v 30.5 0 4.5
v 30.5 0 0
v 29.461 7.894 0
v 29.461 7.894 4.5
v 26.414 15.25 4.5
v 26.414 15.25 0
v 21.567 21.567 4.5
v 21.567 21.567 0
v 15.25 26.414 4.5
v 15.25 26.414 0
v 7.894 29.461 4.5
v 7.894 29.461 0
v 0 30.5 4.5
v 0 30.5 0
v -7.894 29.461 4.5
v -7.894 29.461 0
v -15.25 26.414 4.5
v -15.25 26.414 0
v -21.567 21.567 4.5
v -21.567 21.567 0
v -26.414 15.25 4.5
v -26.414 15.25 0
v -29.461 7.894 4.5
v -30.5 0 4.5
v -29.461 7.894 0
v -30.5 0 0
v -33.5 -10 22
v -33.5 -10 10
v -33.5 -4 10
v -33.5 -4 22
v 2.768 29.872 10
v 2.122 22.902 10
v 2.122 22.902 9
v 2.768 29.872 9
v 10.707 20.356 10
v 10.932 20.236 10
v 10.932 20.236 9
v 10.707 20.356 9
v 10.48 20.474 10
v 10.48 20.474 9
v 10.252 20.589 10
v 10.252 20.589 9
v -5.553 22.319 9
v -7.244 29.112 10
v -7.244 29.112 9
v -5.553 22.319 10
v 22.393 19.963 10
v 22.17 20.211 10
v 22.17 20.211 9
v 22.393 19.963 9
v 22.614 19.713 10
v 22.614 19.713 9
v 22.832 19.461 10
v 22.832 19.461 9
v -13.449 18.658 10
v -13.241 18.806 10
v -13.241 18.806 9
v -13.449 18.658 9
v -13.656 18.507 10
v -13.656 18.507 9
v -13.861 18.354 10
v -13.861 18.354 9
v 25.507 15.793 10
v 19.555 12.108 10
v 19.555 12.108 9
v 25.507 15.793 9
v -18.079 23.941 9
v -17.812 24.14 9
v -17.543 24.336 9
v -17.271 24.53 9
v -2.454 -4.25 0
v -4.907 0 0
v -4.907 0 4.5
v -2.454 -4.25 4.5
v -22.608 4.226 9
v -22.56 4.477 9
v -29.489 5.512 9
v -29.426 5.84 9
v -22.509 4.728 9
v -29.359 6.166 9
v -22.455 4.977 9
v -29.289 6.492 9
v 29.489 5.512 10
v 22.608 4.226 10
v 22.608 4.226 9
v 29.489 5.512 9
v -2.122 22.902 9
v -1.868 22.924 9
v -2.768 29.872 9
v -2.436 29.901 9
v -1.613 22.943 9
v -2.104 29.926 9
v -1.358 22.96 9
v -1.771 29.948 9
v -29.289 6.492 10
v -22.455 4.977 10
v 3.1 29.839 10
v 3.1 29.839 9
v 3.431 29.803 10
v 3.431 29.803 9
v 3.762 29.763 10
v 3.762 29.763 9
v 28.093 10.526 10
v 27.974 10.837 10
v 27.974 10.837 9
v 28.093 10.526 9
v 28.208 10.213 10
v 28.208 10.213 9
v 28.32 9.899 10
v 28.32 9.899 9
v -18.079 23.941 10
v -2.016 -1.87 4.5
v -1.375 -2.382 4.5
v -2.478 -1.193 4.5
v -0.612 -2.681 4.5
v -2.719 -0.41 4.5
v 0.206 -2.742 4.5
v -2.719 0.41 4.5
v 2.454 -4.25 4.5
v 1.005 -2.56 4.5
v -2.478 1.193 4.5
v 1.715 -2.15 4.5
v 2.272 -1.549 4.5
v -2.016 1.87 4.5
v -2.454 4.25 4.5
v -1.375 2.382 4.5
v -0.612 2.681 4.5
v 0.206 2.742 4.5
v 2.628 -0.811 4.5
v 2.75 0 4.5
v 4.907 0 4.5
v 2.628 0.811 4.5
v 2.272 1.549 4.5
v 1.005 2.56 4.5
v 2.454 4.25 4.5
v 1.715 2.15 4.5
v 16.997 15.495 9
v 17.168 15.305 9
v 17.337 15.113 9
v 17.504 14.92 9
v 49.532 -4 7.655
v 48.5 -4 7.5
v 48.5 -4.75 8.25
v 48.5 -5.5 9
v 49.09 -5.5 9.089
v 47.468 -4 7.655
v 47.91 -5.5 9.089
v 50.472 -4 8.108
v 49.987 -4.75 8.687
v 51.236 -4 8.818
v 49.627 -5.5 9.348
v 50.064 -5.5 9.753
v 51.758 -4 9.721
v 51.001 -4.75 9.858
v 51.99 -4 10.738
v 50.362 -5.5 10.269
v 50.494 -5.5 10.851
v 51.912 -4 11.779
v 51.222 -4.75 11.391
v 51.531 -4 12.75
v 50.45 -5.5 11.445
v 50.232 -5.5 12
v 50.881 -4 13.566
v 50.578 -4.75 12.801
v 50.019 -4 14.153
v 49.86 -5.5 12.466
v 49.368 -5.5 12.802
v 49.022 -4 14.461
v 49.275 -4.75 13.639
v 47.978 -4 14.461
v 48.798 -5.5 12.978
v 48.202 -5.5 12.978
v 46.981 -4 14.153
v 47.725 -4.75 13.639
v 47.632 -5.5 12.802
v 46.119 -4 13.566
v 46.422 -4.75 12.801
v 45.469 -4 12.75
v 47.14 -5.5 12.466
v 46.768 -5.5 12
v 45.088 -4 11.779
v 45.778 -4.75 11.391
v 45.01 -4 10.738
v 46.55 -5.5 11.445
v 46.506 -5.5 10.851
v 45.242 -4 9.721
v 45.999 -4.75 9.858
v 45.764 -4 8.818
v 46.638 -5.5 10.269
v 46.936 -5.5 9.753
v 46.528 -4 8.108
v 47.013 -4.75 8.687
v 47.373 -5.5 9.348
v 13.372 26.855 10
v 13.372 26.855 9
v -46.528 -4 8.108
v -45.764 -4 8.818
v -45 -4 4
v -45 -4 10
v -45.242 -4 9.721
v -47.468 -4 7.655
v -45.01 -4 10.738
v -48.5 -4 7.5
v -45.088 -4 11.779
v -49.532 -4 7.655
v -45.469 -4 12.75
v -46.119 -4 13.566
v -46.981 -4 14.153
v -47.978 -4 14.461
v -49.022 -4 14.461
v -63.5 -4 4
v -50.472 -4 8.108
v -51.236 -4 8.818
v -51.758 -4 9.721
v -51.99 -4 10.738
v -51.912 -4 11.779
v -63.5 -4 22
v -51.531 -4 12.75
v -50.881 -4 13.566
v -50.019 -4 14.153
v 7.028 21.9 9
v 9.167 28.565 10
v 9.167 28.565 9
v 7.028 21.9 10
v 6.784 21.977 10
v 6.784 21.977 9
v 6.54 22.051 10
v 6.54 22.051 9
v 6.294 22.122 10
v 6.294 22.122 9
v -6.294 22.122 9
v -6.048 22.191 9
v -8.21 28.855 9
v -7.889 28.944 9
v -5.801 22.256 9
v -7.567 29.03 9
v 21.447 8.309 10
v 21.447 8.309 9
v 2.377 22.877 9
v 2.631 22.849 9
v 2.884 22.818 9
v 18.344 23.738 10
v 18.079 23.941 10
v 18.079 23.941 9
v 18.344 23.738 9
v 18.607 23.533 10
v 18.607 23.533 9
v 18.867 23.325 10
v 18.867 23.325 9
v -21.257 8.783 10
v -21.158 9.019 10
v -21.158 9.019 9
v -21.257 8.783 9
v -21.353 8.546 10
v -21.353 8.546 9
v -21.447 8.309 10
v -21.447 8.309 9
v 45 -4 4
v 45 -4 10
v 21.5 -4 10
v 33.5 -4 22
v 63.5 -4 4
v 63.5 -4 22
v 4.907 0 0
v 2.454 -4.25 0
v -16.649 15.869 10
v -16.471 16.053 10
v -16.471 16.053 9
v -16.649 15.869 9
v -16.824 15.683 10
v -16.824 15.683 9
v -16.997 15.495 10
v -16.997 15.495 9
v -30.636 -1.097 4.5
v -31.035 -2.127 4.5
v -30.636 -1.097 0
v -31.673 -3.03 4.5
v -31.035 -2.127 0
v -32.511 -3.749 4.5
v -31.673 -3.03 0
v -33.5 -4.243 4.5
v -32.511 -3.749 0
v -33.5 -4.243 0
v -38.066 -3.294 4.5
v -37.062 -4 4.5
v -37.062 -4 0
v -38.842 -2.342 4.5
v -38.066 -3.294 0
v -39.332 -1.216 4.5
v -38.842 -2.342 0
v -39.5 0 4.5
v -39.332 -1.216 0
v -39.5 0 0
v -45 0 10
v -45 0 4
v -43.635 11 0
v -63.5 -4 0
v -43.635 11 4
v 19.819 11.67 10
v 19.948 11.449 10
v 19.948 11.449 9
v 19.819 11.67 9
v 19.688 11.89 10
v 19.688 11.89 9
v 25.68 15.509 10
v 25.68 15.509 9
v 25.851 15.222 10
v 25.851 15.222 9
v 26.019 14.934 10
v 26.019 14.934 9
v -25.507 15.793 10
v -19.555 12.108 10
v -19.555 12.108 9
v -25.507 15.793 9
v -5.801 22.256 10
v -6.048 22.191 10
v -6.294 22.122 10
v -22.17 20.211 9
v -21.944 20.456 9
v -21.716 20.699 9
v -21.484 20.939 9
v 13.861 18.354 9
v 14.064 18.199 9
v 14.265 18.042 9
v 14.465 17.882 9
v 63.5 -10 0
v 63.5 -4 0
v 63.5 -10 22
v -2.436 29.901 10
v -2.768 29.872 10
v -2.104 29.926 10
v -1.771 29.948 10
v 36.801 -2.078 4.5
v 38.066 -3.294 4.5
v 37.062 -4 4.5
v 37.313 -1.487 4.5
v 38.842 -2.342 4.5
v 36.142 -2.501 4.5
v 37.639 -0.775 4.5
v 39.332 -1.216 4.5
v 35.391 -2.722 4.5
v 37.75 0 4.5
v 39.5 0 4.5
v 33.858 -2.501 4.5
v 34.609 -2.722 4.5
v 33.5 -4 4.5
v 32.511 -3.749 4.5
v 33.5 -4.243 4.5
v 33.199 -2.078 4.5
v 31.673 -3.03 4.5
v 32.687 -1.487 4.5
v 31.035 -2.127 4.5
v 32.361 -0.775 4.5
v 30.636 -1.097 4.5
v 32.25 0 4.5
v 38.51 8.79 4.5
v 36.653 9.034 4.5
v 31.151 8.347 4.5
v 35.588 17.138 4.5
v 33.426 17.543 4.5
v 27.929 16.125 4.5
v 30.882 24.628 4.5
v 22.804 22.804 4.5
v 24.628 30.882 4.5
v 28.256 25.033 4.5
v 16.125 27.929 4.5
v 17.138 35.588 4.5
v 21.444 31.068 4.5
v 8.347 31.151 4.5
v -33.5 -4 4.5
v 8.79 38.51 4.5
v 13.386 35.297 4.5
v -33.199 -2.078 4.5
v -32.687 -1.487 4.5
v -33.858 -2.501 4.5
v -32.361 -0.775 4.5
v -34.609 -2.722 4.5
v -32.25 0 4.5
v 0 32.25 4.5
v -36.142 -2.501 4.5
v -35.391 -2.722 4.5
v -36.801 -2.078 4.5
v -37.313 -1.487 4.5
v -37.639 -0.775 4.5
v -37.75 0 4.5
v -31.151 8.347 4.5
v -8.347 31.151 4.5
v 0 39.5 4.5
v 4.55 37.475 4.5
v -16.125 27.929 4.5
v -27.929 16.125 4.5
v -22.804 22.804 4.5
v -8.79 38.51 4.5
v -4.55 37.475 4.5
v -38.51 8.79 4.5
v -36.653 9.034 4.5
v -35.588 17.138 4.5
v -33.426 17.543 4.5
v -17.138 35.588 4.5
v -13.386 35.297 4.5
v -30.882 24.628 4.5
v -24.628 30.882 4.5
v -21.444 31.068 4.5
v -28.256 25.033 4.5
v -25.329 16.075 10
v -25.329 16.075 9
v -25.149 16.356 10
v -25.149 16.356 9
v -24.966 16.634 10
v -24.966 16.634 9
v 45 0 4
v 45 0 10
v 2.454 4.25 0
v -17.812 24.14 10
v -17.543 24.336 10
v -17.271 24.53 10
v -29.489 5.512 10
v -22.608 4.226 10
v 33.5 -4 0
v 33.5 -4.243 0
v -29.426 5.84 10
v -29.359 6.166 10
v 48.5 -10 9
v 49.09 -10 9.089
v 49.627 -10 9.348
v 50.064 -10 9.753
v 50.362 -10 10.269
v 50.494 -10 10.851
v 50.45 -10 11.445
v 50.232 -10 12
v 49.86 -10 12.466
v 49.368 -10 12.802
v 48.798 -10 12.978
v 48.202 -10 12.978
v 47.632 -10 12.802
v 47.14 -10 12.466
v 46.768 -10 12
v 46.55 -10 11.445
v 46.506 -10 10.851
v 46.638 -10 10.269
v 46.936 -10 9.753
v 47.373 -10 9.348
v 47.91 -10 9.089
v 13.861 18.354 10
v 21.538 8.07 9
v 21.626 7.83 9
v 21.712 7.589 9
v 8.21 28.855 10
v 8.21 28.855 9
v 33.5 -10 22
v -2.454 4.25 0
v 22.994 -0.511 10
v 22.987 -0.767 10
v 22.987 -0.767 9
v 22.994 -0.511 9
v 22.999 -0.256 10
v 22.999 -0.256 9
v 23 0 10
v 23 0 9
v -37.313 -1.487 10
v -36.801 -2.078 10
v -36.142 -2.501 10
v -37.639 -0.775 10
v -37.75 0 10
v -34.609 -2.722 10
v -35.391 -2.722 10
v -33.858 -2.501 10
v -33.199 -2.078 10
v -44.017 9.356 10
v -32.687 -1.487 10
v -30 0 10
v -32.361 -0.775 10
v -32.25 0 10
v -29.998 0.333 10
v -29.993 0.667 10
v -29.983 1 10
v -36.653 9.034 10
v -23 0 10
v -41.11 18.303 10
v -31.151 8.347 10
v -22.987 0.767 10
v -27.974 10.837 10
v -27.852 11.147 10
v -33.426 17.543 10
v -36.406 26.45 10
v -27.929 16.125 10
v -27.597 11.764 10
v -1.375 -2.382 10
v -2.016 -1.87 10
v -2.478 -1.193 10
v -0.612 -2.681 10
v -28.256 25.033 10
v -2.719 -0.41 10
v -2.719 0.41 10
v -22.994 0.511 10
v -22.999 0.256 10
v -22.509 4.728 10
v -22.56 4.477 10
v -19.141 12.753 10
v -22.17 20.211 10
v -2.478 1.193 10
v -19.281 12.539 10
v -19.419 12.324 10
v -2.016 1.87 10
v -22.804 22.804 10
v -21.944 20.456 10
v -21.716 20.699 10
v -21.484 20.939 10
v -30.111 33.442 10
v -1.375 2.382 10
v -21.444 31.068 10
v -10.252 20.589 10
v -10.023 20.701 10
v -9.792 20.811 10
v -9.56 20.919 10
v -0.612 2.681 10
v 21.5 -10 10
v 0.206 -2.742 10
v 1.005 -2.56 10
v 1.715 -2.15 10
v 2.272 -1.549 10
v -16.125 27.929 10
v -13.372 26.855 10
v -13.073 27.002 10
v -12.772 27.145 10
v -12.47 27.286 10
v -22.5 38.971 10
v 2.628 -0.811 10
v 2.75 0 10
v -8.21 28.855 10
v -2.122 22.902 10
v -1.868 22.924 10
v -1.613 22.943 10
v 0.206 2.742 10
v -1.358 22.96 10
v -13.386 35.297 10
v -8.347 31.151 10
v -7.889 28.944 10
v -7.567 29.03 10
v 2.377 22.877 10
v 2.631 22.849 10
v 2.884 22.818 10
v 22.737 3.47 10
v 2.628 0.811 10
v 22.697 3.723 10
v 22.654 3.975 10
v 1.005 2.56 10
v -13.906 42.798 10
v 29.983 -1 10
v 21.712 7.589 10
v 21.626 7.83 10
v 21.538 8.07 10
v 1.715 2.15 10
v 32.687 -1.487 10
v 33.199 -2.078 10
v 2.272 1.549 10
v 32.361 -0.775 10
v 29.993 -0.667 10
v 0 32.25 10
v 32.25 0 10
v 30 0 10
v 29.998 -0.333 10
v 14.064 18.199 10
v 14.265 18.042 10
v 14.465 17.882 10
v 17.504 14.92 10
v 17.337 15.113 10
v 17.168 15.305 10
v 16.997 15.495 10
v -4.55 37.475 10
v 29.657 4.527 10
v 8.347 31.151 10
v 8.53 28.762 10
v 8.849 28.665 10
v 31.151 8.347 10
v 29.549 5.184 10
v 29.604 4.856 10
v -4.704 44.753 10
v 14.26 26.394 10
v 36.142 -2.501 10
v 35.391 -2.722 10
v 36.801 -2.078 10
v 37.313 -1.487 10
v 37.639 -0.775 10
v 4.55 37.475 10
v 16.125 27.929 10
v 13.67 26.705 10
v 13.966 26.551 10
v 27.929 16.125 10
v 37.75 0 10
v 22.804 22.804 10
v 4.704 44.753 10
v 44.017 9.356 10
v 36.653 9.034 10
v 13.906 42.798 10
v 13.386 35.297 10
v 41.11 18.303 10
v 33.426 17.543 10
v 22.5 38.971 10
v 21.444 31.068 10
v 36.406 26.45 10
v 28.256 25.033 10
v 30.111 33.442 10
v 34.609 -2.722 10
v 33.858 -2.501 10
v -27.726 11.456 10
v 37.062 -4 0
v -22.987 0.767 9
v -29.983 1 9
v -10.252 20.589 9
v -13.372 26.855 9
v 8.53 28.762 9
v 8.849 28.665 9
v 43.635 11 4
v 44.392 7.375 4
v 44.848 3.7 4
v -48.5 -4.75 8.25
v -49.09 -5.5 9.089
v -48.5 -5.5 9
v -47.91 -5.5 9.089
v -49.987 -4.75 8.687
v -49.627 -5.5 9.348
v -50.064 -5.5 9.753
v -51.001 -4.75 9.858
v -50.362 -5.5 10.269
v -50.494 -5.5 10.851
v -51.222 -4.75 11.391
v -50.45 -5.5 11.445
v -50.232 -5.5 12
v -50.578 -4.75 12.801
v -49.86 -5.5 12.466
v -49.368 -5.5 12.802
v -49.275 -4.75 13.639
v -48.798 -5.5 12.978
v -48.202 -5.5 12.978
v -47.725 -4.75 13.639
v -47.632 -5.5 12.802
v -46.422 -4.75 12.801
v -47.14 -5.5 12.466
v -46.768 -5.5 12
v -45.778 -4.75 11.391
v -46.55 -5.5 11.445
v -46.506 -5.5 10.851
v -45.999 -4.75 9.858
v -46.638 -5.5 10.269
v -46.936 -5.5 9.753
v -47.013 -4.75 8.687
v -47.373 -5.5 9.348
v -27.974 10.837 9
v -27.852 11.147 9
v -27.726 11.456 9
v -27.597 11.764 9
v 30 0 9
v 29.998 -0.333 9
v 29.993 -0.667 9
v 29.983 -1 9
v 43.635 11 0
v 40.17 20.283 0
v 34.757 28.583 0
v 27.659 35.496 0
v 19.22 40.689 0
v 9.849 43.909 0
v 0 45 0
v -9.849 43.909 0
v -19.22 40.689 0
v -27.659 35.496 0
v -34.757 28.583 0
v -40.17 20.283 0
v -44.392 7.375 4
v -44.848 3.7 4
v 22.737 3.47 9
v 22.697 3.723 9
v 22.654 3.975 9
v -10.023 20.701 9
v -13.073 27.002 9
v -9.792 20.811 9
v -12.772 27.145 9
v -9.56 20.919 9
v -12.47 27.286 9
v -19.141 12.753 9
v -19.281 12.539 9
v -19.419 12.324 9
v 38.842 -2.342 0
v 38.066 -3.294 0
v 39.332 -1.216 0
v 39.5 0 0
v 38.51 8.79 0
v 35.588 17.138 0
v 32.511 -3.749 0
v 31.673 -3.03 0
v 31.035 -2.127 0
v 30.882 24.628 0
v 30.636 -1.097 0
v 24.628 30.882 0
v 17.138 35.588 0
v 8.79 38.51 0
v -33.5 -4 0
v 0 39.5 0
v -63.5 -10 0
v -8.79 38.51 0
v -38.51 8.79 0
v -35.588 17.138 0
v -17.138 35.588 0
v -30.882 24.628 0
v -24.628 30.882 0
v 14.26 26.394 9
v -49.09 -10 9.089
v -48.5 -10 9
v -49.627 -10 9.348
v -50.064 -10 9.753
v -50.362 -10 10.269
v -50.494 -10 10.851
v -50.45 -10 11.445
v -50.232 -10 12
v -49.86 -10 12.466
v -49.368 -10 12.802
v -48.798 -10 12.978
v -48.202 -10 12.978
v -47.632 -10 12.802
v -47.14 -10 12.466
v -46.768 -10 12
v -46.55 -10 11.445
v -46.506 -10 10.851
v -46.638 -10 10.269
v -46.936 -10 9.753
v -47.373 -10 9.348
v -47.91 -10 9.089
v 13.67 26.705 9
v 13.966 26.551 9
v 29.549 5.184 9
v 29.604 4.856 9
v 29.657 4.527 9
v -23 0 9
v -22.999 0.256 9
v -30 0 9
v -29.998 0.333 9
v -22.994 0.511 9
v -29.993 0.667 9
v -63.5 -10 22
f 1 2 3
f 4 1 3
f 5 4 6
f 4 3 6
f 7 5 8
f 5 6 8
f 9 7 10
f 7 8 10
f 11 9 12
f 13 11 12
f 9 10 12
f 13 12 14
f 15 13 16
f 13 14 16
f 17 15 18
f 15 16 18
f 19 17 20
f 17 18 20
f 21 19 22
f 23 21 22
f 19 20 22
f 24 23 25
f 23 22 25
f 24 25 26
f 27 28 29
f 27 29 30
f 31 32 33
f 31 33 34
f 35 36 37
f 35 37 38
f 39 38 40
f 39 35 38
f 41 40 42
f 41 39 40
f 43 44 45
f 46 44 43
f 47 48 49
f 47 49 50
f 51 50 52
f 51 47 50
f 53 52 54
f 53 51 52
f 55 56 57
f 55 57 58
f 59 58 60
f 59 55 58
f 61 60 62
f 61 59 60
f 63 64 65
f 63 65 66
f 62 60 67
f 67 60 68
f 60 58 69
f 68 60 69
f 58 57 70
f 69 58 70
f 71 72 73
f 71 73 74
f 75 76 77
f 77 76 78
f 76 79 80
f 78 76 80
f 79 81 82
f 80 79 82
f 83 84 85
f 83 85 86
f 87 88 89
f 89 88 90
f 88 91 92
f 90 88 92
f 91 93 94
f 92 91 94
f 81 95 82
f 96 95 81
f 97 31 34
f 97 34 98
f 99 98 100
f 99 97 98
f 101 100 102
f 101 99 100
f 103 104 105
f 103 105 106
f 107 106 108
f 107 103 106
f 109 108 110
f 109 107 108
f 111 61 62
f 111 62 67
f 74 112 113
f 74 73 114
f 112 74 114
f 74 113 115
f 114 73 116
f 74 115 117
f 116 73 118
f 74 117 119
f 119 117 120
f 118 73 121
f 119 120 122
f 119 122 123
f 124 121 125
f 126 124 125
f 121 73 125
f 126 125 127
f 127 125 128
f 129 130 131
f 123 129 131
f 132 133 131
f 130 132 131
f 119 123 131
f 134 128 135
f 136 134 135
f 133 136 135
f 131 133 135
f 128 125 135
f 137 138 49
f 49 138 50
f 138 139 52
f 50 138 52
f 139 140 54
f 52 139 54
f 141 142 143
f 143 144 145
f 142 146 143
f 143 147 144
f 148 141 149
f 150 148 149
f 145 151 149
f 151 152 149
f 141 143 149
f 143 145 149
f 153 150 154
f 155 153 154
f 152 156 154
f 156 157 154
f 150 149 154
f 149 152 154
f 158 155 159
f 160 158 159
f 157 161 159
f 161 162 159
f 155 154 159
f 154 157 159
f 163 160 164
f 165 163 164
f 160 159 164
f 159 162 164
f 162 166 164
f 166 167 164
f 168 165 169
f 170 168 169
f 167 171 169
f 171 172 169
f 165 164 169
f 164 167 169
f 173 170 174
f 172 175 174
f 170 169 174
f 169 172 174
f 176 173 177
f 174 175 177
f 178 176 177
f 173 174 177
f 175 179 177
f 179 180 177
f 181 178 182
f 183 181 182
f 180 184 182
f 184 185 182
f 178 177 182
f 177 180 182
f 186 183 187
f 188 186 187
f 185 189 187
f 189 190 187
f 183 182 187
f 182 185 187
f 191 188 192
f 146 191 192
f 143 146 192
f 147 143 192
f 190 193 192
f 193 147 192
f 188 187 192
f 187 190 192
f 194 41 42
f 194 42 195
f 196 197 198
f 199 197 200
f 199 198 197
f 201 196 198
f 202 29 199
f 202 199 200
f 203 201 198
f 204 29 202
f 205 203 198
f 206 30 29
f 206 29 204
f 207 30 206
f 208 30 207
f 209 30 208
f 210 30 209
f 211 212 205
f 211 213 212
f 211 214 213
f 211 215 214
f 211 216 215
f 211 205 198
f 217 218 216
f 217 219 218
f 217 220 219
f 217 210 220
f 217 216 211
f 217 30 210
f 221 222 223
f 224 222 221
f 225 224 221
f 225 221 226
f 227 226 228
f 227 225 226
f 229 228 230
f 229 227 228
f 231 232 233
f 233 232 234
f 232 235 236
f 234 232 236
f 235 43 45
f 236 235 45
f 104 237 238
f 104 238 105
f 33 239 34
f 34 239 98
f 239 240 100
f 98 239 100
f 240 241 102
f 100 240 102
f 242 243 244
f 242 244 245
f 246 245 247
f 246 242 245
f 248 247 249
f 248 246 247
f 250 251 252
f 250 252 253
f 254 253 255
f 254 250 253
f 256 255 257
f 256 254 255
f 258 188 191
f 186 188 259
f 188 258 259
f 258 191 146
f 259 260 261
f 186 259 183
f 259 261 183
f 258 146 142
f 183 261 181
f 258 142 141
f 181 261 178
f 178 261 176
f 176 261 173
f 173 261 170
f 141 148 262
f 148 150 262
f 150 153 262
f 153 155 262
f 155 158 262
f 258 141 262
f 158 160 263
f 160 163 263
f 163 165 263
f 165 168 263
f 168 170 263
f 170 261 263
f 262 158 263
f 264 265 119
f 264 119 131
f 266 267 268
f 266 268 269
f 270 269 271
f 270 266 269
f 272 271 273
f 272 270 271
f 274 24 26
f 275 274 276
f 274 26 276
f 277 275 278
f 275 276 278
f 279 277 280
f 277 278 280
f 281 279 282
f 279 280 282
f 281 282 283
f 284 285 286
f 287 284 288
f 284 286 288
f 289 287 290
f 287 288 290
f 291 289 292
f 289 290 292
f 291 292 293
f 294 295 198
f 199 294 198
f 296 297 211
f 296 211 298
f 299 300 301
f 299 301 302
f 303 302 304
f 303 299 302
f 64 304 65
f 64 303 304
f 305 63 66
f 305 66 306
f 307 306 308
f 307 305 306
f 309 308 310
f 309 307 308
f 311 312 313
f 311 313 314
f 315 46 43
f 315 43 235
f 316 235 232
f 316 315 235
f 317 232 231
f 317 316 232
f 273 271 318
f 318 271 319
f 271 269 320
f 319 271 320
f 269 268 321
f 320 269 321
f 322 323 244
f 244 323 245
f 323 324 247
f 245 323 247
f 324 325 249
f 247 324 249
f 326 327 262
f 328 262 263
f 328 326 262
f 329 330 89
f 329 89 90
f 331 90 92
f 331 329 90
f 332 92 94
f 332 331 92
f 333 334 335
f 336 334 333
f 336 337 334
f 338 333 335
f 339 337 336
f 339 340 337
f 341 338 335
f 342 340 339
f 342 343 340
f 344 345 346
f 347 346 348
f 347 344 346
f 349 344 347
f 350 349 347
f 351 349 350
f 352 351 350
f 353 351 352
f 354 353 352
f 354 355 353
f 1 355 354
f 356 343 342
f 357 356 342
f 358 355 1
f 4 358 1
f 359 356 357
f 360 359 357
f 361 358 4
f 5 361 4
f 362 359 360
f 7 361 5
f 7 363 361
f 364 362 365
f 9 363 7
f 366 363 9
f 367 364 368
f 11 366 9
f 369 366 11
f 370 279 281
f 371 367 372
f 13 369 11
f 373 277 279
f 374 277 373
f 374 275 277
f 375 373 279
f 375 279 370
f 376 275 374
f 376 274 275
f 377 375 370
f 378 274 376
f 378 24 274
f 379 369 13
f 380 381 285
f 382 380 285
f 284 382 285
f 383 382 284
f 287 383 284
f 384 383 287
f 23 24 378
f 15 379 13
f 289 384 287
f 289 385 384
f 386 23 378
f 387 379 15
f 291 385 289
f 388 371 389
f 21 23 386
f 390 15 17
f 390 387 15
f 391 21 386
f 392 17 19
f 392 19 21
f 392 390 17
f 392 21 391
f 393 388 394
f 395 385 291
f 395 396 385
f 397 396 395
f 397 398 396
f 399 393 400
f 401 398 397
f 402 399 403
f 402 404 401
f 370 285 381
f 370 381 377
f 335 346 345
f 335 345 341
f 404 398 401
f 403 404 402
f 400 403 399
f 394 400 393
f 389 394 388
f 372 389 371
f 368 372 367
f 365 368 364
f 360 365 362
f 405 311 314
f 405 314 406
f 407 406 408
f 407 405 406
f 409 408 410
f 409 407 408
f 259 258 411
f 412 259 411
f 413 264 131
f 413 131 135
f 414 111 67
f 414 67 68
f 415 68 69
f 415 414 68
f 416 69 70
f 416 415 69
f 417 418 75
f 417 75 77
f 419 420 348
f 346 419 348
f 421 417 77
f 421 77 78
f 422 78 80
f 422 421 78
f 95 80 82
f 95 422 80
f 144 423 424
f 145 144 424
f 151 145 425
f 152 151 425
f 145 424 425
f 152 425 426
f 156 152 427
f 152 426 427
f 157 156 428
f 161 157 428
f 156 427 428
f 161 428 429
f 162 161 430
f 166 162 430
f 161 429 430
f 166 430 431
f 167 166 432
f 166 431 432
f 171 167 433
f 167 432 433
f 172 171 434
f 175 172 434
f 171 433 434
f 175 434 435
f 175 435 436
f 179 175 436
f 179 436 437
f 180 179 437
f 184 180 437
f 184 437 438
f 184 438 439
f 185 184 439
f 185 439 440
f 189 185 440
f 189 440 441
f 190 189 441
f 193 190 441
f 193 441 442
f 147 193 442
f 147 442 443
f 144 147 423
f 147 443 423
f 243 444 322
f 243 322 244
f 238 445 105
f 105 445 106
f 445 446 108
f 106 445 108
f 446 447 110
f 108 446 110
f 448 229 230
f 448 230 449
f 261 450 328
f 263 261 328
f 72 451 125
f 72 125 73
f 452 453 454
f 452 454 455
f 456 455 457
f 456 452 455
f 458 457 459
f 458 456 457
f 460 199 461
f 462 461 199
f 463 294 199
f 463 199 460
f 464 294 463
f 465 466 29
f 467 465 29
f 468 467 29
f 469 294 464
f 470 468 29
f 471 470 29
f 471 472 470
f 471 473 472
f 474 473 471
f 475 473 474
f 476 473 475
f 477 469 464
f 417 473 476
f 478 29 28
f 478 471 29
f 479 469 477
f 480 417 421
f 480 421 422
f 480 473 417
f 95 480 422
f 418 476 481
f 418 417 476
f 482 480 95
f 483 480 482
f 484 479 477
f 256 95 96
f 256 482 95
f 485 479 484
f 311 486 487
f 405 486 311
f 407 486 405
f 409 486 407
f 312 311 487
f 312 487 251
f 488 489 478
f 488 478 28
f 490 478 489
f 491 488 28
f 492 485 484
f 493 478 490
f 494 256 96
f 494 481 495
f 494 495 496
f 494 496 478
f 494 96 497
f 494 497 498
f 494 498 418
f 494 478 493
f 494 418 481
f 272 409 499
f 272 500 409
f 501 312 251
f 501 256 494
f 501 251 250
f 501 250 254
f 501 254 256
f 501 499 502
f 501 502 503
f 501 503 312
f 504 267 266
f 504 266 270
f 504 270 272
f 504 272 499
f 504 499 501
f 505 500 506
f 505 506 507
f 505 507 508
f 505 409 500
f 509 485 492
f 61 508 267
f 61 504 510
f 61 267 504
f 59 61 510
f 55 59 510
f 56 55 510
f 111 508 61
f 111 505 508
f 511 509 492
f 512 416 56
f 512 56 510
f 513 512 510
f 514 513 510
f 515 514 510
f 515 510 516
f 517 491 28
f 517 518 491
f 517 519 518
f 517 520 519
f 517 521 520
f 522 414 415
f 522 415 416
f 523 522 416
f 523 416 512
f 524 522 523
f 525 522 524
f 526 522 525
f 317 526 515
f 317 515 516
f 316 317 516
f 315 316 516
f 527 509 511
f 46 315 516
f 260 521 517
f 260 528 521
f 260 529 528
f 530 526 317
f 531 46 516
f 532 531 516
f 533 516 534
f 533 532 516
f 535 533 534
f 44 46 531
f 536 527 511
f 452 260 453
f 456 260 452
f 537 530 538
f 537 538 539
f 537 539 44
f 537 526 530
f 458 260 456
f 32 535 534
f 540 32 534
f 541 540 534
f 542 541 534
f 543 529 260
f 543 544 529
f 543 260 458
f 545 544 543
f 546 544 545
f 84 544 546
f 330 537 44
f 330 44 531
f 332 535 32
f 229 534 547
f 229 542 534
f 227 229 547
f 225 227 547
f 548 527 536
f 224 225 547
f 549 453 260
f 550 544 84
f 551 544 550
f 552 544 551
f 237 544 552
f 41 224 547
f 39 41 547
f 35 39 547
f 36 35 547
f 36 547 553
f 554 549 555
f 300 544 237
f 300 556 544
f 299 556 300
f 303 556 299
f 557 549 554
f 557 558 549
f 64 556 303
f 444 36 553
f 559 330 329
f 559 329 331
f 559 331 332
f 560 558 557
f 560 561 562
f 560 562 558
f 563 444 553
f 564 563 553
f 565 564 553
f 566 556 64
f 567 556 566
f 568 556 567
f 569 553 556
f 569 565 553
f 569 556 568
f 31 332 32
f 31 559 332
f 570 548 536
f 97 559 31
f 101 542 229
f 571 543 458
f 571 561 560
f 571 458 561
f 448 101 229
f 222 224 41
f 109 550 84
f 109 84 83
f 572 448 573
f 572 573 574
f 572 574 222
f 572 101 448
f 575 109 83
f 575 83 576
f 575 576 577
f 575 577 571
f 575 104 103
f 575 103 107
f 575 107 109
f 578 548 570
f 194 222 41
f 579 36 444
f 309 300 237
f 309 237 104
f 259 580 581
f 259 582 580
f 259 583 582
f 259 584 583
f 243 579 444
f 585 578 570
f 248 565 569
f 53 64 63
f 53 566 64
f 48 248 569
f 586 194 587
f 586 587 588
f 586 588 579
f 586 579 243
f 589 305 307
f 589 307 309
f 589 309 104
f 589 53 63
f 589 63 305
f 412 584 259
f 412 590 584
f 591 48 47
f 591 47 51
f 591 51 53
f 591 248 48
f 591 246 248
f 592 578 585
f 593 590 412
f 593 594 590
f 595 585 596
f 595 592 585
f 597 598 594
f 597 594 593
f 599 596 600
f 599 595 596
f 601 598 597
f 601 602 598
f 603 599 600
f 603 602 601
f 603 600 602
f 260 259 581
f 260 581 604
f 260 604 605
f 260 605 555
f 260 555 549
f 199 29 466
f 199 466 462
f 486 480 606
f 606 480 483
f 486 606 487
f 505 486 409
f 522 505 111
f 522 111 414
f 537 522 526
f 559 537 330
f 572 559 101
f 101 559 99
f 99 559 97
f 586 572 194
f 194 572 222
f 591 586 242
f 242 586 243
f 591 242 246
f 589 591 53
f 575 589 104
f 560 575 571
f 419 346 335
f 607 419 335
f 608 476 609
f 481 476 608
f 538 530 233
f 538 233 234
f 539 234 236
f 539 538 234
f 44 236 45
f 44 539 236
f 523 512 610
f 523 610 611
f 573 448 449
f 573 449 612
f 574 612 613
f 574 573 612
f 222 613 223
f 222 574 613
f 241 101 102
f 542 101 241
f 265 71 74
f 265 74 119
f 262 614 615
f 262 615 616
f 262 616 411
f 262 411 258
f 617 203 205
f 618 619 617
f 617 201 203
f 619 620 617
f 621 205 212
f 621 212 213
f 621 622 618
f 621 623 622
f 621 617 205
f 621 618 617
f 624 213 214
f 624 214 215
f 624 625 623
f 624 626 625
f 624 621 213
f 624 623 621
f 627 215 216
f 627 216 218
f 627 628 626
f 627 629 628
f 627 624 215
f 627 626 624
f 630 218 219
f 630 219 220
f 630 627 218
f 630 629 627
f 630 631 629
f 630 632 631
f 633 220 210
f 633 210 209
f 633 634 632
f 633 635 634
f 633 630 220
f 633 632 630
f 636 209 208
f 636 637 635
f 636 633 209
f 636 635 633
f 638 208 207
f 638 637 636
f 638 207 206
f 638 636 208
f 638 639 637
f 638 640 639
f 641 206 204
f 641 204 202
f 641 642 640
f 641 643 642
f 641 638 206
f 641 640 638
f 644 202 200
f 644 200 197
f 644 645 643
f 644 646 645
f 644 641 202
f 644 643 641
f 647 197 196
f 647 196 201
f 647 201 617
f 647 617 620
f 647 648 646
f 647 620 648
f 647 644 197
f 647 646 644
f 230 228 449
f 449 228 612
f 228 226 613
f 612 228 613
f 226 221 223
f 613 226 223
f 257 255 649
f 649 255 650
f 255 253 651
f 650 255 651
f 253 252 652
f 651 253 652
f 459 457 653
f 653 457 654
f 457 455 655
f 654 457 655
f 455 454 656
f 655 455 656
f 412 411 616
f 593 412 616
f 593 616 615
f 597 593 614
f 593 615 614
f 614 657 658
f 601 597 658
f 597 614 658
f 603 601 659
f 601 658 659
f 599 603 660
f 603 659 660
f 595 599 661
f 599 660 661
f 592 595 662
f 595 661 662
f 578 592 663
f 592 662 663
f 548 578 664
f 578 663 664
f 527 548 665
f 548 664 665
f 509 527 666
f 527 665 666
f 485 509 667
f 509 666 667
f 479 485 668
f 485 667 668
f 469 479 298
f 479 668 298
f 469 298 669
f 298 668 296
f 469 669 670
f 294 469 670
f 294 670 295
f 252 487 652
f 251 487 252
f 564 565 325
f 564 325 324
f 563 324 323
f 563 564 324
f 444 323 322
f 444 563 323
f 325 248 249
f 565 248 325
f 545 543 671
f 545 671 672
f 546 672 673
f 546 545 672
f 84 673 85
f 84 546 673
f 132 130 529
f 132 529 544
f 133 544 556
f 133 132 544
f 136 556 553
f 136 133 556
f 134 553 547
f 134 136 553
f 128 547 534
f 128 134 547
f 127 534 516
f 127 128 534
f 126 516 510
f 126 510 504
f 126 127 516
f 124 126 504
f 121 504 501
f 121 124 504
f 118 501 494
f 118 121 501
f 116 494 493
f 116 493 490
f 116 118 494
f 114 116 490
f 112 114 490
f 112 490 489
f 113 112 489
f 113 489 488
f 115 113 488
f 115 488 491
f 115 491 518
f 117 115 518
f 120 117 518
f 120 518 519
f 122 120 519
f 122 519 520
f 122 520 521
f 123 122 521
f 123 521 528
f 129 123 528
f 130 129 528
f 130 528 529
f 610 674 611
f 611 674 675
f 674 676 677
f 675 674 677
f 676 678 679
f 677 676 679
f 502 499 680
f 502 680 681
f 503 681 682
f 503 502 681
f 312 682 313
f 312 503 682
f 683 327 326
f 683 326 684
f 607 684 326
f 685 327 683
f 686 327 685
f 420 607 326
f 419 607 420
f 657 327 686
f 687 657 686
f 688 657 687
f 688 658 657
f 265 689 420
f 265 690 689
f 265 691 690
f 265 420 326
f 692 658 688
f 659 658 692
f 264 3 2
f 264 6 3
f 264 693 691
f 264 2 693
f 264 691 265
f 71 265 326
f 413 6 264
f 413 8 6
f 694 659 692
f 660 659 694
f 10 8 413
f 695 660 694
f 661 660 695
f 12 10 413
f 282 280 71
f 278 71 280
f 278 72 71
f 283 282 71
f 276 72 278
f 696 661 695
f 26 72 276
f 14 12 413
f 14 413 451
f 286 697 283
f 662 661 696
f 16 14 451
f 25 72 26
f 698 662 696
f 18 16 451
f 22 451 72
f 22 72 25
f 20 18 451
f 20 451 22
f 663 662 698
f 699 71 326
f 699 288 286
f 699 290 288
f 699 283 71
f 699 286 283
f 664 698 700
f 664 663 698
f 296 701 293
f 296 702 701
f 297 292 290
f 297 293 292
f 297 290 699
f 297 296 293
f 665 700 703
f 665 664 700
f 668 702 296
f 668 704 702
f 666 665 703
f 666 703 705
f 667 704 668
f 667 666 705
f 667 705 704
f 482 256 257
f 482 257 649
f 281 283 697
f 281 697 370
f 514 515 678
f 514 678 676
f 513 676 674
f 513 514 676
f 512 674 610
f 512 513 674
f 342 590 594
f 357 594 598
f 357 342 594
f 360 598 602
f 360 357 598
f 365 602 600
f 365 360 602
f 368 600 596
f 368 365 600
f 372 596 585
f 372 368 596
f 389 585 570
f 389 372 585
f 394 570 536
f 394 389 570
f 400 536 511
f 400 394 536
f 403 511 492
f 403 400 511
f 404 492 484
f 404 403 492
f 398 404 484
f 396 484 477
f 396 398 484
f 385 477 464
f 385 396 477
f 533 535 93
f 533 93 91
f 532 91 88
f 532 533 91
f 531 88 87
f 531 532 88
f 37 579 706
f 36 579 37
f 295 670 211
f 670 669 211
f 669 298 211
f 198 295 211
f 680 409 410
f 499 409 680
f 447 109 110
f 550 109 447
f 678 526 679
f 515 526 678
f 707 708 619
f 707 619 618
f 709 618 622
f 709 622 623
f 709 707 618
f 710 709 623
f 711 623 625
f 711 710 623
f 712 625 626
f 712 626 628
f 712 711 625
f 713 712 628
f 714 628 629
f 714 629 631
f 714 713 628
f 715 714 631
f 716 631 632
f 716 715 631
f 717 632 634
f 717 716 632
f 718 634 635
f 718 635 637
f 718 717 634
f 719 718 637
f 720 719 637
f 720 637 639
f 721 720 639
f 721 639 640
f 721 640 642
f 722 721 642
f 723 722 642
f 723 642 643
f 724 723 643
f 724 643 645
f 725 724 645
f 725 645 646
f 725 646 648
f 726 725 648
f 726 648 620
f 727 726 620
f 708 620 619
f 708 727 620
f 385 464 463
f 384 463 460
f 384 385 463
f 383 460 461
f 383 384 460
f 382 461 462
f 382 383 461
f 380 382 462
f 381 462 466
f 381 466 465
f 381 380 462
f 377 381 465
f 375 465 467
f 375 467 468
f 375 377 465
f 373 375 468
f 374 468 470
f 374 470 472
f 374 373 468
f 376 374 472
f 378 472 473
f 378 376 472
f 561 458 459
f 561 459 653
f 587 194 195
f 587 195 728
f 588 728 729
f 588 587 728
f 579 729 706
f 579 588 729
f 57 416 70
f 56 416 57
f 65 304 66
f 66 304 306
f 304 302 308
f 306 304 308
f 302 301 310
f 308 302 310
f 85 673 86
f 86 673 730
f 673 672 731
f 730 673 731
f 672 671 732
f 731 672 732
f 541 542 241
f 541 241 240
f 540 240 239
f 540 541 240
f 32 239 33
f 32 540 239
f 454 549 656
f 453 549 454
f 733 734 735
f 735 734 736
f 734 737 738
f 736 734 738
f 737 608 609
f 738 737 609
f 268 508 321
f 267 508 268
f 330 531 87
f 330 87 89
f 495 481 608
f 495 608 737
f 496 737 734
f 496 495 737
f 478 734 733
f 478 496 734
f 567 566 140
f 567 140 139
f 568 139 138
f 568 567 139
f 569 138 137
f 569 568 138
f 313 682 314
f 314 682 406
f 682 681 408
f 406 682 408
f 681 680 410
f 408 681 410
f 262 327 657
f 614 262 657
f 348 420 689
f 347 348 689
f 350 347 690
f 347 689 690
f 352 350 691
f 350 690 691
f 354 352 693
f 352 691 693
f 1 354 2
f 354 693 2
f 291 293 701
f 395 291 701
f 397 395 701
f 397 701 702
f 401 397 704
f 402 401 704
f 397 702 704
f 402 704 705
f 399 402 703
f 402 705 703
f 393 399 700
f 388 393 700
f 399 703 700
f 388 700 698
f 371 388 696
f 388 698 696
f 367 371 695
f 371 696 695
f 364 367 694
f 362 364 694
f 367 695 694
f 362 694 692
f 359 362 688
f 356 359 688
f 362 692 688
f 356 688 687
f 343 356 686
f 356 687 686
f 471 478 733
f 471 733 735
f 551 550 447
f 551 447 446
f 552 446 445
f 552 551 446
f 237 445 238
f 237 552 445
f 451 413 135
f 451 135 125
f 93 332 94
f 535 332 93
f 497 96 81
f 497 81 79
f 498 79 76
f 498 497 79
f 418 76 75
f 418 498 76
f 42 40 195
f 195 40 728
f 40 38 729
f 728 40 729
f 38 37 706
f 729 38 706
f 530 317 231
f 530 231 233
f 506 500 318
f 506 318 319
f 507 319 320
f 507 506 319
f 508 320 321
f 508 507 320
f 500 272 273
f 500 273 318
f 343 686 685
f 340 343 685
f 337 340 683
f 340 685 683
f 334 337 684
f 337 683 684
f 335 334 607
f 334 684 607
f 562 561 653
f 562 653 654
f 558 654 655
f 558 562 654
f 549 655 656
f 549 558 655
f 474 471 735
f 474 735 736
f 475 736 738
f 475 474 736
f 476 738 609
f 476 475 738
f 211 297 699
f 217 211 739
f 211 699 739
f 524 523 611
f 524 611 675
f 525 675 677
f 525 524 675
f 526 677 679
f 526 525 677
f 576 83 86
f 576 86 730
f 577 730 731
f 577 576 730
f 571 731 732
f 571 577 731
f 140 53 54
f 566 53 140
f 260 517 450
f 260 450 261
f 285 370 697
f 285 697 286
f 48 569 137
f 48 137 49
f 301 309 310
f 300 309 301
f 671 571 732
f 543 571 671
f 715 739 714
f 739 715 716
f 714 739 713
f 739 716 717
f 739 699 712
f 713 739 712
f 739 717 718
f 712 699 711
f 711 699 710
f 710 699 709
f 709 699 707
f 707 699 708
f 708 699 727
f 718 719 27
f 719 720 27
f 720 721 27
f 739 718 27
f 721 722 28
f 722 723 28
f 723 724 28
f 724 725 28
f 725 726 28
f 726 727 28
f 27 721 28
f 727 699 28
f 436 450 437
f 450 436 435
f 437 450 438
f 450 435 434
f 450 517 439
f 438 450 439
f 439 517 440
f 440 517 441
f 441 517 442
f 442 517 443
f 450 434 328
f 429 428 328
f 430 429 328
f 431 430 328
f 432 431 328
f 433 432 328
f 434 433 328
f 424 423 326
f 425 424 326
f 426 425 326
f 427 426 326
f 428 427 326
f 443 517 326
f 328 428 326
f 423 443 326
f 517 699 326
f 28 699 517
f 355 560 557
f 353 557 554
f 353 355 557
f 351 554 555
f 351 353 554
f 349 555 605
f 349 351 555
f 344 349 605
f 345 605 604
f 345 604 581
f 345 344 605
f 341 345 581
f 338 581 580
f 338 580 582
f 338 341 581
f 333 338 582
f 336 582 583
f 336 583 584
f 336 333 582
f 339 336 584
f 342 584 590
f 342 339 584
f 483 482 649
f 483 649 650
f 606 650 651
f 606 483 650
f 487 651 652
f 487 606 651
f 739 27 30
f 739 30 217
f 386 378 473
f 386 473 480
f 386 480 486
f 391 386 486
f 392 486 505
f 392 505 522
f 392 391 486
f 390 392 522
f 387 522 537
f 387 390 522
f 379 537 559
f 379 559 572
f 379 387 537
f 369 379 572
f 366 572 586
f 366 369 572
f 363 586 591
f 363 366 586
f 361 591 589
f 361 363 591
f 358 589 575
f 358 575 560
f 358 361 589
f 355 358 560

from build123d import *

# Parameters (mm, degrees)
SKETCH1_R                = 2.75
BOSS_EXTRUDE1_DEPTH      = 10
CUT_EXTRUDE1_DEPTH       = 4.5
CUT_EXTRUDE2_DEPTH       = 1
CIRPATTERN1_COUNT        = 18
CIRPATTERN1_ANGLE        = 180
SKETCH4_W                = 30
SKETCH4_H                = 22
SKETCH4_R                = 2
BOSS_EXTRUDE2_DEPTH      = 6
CHAMFER3_SIZE            = 12
BOSS_EXTRUDE3_DEPTH      = 4
CHAMFER4_SIZE            = 1.5
CHAMFER4_OF_MIRROR1_SIZE = 1.5


with BuildPart() as part:
    # Sketch1 → Boss-Extrude1 (new body)
    with BuildSketch(Plane.XY):
        with BuildLine():
            Line((-45, 0), (-45, -10))
            Line((-45, -10), (45, -10))
            Line((45, -10), (45, 0))
            ThreePointArc((45, 0), (0, 45), (-45, 0))
        make_face()
        Circle(SKETCH1_R, mode=Mode.SUBTRACT)
        with BuildLine():
            ThreePointArc((-32.25, 0), (0, 32.25), (32.25, 0))
            ThreePointArc((32.25, 0), (35, -2.75), (37.75, 0))
            ThreePointArc((37.75, 0), (0, 37.75), (-37.75, 0))
            ThreePointArc((-37.75, 0), (-35, -2.75), (-32.25, 0))
        make_face(mode=Mode.SUBTRACT)
    extrude(amount=BOSS_EXTRUDE1_DEPTH)

    # Sketch2 → Cut-Extrude1 (cut)
    with BuildSketch(Plane(origin=(0, 0, 0), x_dir=(-1, 0, 0), z_dir=(0, 0, -1))):
        Polygon((4.907477288, 0), (2.453738644, -4.25), (-2.453738644, -4.25), (-4.907477288, 0), (-2.453738644, 4.25), (2.453738644, 4.25), align=None)
        with BuildLine():
            ThreePointArc((-30.5, 0), (0, 30.5), (30.5, 0))
            ThreePointArc((30.5, 0), (35, -4.5), (39.5, 0))
            ThreePointArc((39.5, 0), (0, 39.5), (-39.5, 0))
            ThreePointArc((-39.5, 0), (-35, -4.5), (-30.5, 0))
        make_face()
    extrude(amount=-CUT_EXTRUDE1_DEPTH, mode=Mode.SUBTRACT)

    # Sketch3 → Cut-Extrude2 (cut)
    with BuildSketch(Plane.XY.offset(10)):
        with BuildLine():
            Line((-29.983333333, 0.999861101), (-22.987222222, 0.766560178))
            ThreePointArc((-22.987222222, 0.766560178), (-22.996805334, 0.383333333), (-23, 0))
            Line((-23, 0), (-30, 0))
            ThreePointArc((-30, 0), (-29.995833044, 0.5), (-29.983333333, 0.999861101))
        make_face()
    cut_extrude2 = extrude(amount=-CUT_EXTRUDE2_DEPTH, mode=Mode.SUBTRACT)

    # CirPattern1: Cut-Extrude2 ×18 about axis
    cirpattern1_axis = Axis((0, 0, 0), (0, 0, -1))
    for i in range(1, CIRPATTERN1_COUNT):
        add(cut_extrude2.rotate(cirpattern1_axis, i * CIRPATTERN1_ANGLE / (CIRPATTERN1_COUNT - 1)), mode=Mode.SUBTRACT)

    # Sketch4 → Boss-Extrude2 (add)
    with BuildSketch(Plane.XZ.offset(10)):
        with Locations((48.5, 11)):
            Rectangle(SKETCH4_W, SKETCH4_H)
        with Locations(Location((48.5, 11, 0), (0, 0, 270))):
            Circle(SKETCH4_R, mode=Mode.SUBTRACT)
    boss_extrude2 = extrude(amount=-BOSS_EXTRUDE2_DEPTH)

    # Chamfer3
    chamfer3_edges = [part.edges().sort_by_distance(p)[0] for p in [
        (33.5, -7, 10),
    ]]
    chamfer(chamfer3_edges, length=CHAMFER3_SIZE - 0.0001)  # a hair under: the kernel refuses the full size

    # Sketch5 → Boss-Extrude3 (add)
    with BuildSketch(Plane(origin=(0, 0, 0), x_dir=(-1, 0, 0), z_dir=(0, 0, -1))):
        Polygon((-63.5, -4), (-43.634848459, 11), (-43.634848459, -4), align=None)
    boss_extrude3 = extrude(amount=-BOSS_EXTRUDE3_DEPTH)

    # Chamfer4
    chamfer4_edges = [part.edges().sort_by_distance(p)[0] for p in [
        (48.5, -4, 13),
    ]]
    chamfer(chamfer4_edges, length=CHAMFER4_SIZE)

    # Mirror1: Boss-Extrude2, Boss-Extrude3 across plane
    add(boss_extrude2.mirror(Plane(origin=(0, 0, 0), x_dir=(0, 0, 1), z_dir=(1, 0, 0))))
    add(boss_extrude3.mirror(Plane(origin=(0, 0, 0), x_dir=(0, 0, 1), z_dir=(1, 0, 0))))

    # Chamfer4 of Mirror1
    chamfer4_of_mirror1_edges = [part.edges().sort_by_distance(p)[0] for p in [
        (-48.5, -4, 13),
    ]]
    chamfer(chamfer4_of_mirror1_edges, length=CHAMFER4_OF_MIRROR1_SIZE)


solid = part.part
